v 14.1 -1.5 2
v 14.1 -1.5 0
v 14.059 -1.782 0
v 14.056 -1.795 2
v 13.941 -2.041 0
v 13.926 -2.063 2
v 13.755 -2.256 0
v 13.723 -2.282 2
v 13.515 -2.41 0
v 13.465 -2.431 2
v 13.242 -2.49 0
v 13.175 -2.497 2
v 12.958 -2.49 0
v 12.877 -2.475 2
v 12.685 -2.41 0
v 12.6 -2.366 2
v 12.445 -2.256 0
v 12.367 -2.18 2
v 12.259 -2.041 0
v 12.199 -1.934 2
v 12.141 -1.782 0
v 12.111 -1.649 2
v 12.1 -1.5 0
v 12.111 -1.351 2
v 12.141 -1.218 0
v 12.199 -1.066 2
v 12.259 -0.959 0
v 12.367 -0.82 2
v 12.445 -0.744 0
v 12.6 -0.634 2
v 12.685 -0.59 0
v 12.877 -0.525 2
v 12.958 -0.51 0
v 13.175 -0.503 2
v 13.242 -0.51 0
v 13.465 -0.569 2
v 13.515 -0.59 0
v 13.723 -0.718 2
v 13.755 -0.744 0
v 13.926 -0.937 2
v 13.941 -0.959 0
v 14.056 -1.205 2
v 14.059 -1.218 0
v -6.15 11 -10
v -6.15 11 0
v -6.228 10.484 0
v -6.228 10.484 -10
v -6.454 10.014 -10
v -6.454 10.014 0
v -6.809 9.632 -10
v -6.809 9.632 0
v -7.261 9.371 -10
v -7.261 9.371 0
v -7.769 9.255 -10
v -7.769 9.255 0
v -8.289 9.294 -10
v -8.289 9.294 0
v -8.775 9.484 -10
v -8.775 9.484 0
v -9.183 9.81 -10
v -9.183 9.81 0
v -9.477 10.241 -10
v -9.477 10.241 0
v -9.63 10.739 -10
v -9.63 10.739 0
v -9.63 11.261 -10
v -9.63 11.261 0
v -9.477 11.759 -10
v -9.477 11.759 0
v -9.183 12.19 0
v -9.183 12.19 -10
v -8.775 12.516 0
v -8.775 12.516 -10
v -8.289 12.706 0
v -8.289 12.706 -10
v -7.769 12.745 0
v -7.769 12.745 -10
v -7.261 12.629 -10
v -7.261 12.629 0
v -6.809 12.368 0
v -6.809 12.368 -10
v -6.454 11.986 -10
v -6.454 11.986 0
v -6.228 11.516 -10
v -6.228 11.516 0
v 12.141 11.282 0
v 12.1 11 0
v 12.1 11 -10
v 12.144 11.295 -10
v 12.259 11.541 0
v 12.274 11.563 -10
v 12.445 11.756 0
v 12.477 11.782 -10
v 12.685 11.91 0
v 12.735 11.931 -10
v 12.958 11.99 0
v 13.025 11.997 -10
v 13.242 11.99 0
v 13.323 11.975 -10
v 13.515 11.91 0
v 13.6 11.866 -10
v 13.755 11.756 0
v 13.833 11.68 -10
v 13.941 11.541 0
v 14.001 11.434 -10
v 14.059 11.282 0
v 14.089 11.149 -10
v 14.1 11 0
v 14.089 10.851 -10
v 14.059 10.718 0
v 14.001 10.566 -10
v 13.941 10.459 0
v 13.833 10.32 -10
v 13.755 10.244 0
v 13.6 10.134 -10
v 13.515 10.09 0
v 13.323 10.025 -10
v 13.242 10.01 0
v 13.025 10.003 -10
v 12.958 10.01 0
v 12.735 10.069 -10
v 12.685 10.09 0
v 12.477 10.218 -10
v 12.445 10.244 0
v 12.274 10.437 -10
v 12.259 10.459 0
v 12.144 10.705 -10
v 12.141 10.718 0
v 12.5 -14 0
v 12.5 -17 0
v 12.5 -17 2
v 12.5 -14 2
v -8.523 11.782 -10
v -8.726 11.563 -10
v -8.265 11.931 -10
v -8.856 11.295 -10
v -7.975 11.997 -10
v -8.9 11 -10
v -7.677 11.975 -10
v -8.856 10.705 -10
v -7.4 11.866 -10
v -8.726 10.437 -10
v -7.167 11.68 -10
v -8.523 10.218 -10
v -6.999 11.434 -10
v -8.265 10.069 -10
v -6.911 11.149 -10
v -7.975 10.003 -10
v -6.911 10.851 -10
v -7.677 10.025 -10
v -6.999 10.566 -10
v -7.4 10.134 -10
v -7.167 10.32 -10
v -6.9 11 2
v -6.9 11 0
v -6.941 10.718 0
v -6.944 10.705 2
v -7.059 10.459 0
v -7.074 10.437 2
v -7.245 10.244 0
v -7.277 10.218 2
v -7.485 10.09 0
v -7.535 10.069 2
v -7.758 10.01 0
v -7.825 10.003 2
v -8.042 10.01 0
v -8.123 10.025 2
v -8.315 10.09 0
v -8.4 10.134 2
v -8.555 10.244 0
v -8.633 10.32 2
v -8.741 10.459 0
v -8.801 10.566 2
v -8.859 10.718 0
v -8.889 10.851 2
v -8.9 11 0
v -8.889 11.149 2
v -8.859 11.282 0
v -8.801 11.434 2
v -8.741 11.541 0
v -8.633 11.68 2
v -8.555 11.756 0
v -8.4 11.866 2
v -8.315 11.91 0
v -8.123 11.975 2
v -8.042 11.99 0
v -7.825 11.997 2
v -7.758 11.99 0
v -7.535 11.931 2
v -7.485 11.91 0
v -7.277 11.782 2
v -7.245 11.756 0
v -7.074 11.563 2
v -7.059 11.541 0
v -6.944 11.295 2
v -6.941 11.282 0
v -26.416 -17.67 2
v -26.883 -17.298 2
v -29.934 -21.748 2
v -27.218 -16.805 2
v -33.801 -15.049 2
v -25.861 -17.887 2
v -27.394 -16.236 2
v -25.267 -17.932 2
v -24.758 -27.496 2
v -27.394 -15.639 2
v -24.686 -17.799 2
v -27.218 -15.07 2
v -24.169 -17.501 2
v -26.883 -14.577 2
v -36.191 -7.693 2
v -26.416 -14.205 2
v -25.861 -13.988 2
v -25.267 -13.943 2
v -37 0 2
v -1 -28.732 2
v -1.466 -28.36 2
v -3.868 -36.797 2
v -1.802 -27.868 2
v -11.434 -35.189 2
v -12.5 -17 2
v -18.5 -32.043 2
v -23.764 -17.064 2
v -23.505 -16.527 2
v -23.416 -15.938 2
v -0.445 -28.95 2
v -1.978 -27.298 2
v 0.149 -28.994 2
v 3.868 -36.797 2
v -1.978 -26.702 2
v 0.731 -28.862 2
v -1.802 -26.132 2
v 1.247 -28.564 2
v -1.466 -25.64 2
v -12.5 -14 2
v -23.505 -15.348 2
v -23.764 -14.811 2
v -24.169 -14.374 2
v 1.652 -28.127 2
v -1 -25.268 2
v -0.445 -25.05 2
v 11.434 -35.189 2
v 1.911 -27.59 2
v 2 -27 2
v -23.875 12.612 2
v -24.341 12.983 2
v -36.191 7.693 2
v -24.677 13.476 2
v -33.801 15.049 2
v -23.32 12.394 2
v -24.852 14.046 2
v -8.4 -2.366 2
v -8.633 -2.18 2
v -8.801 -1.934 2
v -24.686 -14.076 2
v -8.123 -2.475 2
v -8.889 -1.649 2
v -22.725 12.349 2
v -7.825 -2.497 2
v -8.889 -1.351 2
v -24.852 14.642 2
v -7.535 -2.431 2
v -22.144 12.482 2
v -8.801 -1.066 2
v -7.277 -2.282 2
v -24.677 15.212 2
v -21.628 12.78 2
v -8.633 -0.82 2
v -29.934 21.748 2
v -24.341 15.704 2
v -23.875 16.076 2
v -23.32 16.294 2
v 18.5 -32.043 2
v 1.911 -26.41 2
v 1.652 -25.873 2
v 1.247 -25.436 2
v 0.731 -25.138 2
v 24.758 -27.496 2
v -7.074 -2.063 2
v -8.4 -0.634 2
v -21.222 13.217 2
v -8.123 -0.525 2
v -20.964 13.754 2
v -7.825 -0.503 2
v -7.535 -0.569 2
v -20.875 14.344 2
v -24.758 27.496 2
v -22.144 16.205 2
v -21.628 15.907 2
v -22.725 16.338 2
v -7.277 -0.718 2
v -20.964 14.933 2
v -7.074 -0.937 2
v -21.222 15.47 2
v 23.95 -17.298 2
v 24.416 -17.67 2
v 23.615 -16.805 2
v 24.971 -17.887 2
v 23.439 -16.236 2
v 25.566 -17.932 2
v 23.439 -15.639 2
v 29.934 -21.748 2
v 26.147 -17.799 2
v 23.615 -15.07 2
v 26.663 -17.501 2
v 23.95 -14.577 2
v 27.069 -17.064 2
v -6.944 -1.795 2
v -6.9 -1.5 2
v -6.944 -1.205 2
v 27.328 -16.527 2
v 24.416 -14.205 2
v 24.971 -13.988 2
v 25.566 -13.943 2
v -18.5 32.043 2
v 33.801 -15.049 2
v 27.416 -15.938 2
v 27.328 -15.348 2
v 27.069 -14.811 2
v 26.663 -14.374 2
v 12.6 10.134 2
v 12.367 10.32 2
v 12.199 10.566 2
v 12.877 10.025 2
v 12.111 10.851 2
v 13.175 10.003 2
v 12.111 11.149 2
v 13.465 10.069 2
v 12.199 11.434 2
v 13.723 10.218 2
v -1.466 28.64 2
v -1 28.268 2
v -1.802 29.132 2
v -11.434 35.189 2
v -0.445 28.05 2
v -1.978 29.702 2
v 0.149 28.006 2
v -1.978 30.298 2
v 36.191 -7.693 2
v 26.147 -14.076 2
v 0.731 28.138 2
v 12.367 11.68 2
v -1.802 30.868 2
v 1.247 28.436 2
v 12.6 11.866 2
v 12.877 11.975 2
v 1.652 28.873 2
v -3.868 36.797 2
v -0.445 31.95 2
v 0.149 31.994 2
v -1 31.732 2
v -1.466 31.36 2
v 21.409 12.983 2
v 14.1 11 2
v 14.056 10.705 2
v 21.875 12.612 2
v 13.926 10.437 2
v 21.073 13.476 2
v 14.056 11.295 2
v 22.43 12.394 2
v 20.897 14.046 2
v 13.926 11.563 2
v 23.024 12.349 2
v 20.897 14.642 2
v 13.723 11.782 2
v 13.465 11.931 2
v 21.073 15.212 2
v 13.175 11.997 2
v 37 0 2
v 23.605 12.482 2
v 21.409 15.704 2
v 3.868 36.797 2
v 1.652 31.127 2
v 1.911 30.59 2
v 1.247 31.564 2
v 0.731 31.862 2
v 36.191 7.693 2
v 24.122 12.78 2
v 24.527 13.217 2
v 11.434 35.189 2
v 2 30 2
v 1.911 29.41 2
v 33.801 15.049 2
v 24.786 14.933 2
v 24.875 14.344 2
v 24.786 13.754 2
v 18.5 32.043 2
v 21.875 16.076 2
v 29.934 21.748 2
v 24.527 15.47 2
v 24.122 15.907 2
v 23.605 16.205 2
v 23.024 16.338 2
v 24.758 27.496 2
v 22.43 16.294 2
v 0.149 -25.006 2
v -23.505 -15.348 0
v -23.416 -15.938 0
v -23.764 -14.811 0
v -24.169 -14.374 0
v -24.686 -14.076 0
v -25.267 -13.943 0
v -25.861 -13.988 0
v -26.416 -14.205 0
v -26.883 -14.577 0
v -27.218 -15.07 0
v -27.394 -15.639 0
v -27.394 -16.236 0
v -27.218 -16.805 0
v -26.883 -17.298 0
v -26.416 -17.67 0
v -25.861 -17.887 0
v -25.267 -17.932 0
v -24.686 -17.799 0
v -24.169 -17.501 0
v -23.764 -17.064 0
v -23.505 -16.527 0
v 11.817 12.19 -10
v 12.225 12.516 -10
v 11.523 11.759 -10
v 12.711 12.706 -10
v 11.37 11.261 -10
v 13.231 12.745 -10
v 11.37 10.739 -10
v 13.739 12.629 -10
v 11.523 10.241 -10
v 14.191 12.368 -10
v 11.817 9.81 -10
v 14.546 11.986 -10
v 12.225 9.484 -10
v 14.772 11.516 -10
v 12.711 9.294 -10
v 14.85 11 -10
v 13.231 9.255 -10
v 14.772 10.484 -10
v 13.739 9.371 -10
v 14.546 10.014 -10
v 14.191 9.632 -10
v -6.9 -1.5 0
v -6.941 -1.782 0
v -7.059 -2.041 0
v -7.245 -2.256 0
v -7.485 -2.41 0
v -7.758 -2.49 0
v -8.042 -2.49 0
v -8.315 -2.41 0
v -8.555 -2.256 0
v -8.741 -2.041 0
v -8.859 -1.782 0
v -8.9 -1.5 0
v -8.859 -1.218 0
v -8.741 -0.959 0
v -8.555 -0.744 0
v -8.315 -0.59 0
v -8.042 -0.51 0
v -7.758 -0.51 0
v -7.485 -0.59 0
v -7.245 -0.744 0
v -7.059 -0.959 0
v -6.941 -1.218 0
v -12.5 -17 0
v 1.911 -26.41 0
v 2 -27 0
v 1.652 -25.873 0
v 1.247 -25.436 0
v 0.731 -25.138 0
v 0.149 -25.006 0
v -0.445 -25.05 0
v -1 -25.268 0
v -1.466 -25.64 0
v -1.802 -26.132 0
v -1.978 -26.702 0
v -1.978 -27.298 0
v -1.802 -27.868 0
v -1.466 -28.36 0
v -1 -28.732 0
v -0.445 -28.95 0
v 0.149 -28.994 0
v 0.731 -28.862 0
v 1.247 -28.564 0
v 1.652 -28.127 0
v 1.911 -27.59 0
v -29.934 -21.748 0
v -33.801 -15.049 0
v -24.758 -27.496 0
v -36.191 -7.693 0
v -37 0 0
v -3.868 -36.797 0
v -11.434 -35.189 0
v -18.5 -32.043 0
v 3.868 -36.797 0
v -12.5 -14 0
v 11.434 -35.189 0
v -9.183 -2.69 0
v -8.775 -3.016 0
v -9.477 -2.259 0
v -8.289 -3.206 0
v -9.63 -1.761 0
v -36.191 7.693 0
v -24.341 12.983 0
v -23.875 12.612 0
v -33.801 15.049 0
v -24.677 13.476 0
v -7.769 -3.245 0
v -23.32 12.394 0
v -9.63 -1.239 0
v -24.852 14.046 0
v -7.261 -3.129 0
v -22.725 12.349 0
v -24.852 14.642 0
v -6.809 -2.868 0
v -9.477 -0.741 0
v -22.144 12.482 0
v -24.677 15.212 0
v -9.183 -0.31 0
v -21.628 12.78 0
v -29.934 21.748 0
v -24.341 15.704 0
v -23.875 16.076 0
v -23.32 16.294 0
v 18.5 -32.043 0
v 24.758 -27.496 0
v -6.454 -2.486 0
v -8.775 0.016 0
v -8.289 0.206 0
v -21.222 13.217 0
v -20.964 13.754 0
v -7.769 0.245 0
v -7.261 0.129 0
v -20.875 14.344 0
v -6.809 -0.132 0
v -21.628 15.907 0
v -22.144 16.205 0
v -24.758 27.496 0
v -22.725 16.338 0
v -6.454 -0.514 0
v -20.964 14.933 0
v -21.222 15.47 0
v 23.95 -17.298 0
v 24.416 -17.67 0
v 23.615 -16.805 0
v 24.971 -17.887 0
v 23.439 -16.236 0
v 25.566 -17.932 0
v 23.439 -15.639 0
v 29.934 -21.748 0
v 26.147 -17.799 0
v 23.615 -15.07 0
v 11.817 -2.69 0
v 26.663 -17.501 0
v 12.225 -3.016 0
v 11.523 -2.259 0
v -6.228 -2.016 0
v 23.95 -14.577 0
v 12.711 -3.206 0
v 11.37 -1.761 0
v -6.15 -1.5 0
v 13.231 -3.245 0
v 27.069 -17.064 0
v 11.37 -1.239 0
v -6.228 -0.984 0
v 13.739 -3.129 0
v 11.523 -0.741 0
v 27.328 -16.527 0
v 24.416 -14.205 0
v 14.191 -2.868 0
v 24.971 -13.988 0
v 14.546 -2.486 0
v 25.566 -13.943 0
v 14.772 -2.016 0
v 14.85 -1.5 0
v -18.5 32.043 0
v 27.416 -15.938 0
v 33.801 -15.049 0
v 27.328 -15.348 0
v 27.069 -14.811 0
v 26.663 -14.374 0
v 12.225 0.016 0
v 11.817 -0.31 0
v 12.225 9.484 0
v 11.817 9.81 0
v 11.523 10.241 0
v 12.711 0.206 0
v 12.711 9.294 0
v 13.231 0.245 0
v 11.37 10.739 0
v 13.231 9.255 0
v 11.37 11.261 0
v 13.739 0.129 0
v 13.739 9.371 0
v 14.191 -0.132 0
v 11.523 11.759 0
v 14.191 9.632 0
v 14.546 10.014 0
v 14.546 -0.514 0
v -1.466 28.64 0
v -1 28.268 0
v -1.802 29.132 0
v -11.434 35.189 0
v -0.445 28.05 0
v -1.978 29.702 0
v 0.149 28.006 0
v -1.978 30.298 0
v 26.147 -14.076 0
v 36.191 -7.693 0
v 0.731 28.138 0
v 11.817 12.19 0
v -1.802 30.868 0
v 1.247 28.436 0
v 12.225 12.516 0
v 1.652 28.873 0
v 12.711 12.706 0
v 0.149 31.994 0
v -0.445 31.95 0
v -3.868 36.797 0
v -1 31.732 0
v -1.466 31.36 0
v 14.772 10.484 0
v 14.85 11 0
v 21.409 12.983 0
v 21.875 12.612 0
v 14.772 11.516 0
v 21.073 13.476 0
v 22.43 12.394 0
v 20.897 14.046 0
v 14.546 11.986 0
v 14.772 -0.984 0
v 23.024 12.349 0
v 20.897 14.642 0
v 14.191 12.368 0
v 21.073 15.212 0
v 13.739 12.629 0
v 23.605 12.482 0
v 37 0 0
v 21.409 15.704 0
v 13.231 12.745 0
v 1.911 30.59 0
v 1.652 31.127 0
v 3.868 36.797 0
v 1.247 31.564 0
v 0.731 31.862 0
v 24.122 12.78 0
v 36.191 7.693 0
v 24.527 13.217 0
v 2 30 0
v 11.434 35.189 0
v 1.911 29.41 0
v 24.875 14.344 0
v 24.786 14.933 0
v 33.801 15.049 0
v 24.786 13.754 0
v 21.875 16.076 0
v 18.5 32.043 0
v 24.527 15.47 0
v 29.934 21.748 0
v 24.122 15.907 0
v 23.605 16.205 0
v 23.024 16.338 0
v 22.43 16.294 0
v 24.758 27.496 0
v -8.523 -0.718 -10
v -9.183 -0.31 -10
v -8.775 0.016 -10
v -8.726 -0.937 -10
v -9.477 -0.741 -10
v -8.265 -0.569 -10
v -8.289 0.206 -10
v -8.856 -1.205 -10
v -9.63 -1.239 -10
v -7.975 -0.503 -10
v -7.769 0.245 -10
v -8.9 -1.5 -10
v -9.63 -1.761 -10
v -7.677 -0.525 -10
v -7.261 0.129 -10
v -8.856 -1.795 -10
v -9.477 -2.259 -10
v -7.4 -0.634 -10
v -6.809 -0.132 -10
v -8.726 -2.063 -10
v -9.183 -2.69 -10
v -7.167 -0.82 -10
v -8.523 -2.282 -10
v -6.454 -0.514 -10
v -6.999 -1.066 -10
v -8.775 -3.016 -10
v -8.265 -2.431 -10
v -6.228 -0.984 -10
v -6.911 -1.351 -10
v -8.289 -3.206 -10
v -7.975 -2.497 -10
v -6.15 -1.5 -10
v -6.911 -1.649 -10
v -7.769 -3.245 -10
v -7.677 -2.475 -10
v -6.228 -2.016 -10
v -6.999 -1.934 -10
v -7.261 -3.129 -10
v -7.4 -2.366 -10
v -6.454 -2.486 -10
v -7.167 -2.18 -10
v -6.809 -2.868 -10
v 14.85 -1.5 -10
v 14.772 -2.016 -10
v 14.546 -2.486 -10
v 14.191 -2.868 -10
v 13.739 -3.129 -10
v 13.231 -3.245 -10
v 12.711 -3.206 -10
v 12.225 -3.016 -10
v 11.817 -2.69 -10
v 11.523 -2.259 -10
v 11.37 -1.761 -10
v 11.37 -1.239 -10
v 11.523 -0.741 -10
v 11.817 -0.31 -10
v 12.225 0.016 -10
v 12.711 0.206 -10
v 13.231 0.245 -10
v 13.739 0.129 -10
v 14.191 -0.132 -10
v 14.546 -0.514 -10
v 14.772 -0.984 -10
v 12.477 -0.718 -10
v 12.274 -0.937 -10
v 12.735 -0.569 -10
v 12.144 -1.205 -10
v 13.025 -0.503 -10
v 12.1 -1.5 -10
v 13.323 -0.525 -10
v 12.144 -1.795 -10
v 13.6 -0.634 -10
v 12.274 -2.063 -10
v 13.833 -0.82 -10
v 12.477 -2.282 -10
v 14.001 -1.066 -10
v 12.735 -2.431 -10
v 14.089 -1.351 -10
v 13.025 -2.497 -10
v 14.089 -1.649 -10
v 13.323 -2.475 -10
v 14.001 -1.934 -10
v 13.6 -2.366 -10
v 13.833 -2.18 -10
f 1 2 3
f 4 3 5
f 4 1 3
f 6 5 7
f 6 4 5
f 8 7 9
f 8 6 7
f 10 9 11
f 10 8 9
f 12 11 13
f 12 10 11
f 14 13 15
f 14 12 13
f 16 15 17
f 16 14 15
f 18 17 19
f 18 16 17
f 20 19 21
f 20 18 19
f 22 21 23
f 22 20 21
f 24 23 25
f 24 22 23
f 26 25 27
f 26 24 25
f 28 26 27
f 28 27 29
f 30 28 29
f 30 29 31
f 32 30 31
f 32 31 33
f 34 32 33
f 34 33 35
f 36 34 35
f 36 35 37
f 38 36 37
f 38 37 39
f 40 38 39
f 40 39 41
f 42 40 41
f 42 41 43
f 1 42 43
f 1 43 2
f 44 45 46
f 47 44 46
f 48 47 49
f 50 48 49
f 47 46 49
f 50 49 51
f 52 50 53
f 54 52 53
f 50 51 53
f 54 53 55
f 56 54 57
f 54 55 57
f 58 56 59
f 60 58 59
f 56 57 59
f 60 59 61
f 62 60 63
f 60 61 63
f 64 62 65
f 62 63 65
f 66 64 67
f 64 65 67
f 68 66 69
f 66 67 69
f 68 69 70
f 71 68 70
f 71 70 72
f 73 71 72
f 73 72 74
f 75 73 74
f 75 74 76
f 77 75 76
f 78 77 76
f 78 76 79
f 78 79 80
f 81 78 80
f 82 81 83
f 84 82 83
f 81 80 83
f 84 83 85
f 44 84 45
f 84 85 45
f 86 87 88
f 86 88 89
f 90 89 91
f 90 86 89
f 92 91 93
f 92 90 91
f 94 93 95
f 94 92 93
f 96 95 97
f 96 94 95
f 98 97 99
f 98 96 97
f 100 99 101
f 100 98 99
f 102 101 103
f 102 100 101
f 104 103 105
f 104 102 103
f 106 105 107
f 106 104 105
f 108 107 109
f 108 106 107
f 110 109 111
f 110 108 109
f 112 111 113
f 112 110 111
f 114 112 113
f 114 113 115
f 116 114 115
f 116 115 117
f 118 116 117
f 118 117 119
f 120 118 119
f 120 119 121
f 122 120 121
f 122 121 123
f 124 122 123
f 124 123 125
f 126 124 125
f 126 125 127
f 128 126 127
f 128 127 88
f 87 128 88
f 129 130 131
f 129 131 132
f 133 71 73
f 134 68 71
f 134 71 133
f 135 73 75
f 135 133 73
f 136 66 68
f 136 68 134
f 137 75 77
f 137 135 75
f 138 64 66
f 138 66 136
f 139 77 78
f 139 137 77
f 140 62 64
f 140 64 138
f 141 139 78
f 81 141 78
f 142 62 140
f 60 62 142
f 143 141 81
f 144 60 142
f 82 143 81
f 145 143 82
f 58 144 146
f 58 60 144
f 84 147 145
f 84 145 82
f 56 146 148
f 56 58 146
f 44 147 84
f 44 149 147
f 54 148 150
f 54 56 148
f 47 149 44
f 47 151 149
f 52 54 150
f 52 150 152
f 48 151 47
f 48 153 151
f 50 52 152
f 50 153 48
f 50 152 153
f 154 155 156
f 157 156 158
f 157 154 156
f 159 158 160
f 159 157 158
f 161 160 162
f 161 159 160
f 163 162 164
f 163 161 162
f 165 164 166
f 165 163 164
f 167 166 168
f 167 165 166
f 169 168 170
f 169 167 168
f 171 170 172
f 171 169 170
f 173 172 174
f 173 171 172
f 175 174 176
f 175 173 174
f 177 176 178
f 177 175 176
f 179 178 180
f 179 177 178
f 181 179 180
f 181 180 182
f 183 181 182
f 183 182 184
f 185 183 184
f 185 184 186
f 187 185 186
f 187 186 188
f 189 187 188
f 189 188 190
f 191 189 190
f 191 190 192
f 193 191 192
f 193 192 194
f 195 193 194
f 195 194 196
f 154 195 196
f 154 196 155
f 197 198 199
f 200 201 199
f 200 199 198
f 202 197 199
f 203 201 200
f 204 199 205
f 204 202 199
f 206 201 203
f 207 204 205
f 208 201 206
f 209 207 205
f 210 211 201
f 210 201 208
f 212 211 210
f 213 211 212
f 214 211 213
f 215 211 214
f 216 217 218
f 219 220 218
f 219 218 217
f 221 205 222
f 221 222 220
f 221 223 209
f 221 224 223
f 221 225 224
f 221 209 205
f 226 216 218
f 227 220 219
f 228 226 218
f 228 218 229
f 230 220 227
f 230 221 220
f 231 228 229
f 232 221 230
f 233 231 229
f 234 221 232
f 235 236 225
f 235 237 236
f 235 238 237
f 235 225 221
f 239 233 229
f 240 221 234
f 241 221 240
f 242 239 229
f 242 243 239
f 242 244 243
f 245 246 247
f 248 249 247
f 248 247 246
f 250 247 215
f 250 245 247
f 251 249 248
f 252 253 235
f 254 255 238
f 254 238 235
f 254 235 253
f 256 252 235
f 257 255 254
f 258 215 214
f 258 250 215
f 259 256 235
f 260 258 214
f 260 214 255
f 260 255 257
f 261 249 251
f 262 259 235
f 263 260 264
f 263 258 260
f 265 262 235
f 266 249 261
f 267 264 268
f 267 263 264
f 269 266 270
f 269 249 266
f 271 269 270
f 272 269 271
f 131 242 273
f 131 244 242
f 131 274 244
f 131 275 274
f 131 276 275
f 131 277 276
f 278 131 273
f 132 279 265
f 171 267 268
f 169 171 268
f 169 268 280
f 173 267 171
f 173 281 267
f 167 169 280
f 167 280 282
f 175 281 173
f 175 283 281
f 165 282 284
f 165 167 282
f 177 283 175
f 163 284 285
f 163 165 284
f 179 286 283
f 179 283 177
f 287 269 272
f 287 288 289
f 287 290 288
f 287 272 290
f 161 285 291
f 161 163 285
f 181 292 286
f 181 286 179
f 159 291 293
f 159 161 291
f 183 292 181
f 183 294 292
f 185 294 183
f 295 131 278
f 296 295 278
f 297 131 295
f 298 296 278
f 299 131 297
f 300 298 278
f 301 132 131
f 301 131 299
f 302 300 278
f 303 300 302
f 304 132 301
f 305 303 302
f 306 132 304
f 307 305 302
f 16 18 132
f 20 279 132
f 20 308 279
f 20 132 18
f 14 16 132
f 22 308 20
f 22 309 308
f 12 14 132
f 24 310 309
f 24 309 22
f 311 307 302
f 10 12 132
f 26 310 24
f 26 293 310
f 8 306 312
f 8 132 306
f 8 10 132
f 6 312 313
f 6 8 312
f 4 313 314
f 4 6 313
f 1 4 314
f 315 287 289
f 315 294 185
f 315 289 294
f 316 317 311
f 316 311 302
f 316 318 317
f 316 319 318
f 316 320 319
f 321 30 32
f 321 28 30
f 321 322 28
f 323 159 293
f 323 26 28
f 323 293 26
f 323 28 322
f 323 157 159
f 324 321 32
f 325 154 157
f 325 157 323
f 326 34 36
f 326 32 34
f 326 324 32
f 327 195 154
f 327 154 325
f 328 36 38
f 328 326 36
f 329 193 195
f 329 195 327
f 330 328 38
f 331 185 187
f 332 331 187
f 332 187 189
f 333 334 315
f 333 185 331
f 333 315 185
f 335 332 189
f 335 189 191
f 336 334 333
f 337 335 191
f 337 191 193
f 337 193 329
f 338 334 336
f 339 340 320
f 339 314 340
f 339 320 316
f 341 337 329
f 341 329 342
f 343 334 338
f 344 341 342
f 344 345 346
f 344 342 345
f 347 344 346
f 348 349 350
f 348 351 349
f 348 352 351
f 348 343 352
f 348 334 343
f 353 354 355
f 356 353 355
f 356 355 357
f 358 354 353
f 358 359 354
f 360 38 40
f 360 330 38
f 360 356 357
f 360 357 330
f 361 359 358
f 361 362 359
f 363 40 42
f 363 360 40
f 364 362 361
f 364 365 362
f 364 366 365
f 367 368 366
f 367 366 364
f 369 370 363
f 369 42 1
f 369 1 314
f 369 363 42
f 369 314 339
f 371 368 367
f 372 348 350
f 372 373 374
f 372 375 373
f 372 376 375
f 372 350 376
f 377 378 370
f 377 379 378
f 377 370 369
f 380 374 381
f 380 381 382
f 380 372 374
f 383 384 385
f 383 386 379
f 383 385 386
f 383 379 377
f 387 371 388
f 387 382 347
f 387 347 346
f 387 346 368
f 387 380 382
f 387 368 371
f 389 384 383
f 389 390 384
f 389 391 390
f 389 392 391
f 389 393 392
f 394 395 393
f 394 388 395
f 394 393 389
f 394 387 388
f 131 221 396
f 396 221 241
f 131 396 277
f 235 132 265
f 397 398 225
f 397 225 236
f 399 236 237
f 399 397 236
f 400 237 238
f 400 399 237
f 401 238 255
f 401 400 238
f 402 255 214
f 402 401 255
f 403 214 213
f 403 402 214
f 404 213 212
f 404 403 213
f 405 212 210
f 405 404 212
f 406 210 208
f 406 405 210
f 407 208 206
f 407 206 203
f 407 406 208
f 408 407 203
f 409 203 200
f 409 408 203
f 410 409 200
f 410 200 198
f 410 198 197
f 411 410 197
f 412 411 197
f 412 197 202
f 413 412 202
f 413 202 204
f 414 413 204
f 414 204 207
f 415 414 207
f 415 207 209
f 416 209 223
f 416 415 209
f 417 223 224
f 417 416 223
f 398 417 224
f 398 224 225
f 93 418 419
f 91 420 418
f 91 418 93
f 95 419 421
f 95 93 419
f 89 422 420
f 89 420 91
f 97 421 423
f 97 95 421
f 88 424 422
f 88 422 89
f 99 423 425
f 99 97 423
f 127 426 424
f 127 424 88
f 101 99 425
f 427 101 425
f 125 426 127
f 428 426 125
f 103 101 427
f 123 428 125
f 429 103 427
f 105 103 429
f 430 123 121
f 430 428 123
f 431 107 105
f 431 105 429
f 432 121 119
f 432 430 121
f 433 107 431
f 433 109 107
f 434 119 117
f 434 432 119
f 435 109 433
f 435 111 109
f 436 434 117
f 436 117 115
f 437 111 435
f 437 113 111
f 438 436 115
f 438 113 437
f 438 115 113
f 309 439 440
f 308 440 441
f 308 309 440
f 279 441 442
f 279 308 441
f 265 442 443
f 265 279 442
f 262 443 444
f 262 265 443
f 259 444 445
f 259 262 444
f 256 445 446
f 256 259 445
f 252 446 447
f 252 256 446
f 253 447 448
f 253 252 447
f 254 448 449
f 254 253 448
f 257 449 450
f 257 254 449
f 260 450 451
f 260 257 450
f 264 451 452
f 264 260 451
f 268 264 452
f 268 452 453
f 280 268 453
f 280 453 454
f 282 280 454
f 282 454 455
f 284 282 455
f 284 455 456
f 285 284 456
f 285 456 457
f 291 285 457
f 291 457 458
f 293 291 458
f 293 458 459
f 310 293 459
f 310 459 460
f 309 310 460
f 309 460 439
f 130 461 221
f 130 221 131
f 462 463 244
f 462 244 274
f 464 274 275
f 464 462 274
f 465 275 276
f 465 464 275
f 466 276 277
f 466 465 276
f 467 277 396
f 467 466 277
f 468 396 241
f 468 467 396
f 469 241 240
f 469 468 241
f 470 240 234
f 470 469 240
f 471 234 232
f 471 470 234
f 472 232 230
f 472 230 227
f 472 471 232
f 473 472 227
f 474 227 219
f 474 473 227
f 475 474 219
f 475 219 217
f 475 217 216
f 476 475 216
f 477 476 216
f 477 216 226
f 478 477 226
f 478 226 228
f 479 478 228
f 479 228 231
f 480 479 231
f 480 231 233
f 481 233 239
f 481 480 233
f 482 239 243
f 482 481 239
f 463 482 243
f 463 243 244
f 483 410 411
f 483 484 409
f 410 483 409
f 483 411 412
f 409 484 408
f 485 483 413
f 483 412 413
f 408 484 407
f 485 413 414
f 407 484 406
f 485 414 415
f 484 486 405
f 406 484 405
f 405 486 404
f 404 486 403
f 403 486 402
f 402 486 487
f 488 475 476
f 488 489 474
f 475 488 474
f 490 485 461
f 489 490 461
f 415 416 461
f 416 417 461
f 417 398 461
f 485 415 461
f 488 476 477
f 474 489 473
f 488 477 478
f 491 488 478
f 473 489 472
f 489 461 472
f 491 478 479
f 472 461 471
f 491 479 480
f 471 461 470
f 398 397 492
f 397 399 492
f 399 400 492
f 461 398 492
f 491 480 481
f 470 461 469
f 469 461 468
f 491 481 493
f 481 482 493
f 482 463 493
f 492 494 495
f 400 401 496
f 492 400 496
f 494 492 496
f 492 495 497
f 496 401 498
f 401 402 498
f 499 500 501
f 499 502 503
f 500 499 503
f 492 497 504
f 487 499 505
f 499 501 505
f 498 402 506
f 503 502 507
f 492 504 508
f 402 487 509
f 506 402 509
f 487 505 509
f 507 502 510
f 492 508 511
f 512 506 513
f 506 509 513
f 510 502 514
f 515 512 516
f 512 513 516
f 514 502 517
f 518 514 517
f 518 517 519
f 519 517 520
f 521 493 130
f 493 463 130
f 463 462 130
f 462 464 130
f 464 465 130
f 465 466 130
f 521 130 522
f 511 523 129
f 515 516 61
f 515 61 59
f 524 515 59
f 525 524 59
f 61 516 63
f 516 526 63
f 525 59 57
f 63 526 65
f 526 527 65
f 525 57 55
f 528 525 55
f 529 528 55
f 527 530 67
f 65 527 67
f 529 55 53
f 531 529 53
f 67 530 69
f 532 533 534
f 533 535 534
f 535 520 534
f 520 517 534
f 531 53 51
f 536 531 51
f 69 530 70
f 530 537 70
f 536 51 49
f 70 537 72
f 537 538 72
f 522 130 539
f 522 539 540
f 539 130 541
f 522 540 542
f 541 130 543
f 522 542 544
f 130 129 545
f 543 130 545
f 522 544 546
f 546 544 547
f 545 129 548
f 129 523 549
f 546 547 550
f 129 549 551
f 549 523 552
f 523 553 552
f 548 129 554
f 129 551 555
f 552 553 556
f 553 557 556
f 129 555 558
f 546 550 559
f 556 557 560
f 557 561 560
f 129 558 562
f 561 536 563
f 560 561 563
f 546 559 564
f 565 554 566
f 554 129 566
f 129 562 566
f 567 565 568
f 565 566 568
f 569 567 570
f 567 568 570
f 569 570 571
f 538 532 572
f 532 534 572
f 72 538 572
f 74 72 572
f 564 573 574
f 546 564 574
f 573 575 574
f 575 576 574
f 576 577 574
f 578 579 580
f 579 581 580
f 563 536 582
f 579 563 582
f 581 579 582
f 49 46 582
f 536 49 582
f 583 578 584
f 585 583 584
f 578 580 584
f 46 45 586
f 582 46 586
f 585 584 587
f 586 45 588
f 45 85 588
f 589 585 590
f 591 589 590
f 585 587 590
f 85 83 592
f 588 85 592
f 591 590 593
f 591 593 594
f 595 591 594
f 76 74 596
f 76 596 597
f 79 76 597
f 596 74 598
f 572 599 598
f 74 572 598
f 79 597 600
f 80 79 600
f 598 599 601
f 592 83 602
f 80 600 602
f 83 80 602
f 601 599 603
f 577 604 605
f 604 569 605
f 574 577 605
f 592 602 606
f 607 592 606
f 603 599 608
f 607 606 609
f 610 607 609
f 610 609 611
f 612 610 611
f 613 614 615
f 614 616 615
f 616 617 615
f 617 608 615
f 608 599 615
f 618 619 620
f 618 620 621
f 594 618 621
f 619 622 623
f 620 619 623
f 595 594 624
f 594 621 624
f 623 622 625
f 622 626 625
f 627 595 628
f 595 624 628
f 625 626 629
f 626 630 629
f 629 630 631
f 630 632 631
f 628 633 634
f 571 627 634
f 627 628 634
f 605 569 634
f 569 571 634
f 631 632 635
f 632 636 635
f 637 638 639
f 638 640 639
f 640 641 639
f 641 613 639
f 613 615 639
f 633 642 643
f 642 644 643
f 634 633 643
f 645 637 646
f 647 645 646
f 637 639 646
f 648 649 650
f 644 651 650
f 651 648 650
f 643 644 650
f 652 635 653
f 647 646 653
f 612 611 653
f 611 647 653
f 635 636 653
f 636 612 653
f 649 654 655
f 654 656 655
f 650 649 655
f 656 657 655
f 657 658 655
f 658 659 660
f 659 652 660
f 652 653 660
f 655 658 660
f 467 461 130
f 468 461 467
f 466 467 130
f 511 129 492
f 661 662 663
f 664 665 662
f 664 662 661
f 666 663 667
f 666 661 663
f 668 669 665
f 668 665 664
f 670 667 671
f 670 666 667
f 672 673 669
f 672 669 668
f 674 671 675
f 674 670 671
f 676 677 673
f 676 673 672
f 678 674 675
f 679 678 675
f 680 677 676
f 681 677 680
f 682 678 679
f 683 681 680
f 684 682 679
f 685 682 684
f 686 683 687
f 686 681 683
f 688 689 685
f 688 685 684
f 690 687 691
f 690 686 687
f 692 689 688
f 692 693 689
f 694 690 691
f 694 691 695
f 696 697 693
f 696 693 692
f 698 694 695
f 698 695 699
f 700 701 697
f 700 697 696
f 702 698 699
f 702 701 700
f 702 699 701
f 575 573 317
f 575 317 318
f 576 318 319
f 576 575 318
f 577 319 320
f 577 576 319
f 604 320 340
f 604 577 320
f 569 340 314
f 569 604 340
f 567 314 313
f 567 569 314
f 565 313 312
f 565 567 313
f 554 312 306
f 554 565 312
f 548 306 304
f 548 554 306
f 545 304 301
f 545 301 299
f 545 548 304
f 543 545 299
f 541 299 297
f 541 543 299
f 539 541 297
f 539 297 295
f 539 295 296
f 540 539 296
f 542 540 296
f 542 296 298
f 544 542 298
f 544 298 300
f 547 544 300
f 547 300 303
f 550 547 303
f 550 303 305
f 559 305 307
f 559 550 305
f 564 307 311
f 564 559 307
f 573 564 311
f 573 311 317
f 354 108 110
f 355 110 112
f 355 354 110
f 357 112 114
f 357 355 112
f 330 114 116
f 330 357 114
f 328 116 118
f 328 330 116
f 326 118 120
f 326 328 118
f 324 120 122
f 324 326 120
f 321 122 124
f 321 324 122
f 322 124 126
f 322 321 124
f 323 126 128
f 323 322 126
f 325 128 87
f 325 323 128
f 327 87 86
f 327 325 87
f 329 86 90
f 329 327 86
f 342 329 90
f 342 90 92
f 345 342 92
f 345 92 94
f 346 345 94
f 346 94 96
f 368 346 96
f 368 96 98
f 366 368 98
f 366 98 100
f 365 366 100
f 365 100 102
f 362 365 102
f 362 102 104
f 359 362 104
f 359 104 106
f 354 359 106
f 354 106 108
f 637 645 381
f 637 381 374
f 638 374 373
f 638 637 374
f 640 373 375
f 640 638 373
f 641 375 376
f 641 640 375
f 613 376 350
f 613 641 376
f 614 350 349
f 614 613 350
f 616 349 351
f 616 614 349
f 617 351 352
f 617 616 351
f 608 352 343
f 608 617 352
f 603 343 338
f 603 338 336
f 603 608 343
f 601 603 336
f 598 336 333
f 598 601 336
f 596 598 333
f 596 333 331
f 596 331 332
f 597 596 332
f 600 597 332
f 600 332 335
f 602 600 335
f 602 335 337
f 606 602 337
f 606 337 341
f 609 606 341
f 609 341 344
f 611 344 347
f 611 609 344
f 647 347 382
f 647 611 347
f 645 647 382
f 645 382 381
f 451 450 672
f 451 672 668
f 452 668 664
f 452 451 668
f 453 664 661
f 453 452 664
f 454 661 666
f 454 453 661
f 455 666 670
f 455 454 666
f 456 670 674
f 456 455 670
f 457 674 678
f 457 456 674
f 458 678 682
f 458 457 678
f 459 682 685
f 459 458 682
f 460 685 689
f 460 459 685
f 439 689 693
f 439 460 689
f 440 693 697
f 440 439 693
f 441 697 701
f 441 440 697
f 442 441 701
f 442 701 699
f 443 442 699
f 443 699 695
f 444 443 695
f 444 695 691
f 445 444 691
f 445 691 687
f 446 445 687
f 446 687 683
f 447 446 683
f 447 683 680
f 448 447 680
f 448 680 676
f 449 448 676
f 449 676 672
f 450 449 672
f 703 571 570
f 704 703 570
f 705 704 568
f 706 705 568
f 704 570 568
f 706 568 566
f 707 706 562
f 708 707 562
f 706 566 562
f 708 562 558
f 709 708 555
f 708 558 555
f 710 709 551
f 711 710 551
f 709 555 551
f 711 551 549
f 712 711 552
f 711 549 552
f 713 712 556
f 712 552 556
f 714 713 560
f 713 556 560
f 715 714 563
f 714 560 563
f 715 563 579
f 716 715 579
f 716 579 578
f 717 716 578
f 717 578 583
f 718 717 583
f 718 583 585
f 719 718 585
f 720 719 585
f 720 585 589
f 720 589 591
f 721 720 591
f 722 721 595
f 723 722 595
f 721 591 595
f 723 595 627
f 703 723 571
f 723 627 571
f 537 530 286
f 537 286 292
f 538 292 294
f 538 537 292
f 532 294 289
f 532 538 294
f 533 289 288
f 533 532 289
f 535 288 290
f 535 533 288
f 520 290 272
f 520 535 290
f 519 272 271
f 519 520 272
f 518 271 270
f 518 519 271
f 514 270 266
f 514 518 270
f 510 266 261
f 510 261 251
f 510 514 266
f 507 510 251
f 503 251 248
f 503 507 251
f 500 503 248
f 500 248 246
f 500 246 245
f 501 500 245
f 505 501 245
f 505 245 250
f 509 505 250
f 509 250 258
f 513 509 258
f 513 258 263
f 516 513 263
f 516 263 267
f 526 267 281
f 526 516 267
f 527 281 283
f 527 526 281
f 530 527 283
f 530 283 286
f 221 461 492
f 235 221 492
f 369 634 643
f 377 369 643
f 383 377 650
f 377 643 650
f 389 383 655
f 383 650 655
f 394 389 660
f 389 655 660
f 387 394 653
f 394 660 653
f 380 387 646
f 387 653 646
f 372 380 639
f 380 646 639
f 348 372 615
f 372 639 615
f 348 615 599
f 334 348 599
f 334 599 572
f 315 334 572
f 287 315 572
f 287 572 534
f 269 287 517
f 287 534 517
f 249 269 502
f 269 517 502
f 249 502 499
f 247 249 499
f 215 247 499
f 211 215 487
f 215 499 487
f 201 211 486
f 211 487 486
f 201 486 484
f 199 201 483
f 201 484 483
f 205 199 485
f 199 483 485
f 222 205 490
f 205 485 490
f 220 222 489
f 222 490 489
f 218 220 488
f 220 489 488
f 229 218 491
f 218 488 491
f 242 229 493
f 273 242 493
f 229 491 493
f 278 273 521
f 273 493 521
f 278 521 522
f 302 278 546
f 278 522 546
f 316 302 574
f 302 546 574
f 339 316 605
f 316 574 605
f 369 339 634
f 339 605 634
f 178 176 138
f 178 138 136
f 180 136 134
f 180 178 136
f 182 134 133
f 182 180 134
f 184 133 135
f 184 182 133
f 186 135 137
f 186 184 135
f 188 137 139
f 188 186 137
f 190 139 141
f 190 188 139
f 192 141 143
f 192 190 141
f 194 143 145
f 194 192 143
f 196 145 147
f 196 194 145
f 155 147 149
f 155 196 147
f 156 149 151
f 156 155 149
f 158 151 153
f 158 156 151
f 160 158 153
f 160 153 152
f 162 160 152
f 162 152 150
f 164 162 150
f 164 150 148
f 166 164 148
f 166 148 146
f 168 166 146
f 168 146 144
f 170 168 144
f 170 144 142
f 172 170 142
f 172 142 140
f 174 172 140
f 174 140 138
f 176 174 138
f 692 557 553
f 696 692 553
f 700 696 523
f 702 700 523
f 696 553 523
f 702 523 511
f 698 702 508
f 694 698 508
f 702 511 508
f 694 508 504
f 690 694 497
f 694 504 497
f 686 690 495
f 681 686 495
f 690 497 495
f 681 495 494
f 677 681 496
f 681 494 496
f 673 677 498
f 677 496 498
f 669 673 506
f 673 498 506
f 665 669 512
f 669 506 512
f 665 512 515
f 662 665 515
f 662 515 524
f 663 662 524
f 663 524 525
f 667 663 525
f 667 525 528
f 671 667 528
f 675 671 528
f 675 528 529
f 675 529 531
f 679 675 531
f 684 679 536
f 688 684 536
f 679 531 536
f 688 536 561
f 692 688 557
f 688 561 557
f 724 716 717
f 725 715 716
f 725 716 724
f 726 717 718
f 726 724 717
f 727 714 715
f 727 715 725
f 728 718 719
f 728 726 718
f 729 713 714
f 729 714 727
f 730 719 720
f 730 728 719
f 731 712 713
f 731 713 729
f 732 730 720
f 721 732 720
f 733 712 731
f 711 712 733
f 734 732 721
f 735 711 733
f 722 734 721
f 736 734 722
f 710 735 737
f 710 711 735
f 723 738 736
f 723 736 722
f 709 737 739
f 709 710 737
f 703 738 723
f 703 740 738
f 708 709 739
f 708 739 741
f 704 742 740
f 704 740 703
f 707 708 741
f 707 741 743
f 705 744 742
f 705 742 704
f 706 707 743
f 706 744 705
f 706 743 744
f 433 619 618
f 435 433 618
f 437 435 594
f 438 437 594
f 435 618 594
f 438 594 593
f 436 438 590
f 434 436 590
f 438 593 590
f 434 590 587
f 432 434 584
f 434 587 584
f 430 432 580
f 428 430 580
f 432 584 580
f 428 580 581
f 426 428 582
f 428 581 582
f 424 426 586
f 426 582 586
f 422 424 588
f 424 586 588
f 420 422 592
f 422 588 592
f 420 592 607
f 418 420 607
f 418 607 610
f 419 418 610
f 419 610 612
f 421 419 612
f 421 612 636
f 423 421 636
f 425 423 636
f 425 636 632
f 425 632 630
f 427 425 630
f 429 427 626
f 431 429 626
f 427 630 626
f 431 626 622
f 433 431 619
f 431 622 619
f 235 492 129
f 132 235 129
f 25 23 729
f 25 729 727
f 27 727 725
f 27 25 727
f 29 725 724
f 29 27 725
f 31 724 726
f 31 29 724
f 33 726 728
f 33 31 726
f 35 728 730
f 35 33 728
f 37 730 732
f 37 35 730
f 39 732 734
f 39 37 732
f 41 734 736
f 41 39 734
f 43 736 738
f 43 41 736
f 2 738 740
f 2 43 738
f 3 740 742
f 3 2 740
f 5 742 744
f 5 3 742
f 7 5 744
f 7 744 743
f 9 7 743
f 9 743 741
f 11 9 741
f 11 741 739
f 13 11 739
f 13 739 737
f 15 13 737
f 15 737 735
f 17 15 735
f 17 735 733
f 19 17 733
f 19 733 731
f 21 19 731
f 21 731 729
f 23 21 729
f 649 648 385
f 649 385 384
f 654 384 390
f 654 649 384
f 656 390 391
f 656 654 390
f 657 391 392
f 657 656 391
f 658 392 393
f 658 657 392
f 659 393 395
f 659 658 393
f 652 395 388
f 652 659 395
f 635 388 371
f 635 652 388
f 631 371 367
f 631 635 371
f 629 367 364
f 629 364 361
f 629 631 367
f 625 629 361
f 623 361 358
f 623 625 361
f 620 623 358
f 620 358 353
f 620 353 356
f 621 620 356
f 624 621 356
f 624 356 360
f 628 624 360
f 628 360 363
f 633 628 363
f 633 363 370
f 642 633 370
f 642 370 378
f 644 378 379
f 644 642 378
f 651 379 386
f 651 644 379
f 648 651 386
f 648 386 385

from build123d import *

# Parameters (mm, degrees)
ESQUISSE1_R             = 37
ESQUISSE1_R_2           = 2
ESQUISSE1_W             = 25
ESQUISSE1_H             = 3
BOSS_EXTRU_1_DEPTH      = 2
BOSS_EXTRU_2_DEPTH      = 15
ESQUISSE3_W             = 2
ESQUISSE3_H             = 28.4
BOSS_EXTRU_3_DEPTH      = 2.25
ESQUISSE5_W             = 2
ESQUISSE5_H             = 24.4
BOSS_EXTRU_4_DEPTH      = 2.25
ESQUISSE7_W             = 33.1
ESQUISSE7_H             = 28.4
BOSS_EXTRU_5_DEPTH      = 1
ESQUISSE8_W             = 15
ESQUISSE8_H             = 15
ENL_V_MAT_EXTRU_1_DEPTH = 3
ESQUISSE9_W             = 21
ESQUISSE9_H             = 2.5
ENL_V_MAT_EXTRU_2_DEPTH = 3
ESQUISSE11_W            = 33.1
ESQUISSE11_H            = 28.4
ENL_V_MAT_EXTRU_4_DEPTH = 15
SKETCH1_R               = 1.75
SKETCH1_R_2             = 1
BOSS_EXTRUDE1_DEPTH     = 10
CUT_EXTRUDE1_START      = -10
SKETCH1_3_R             = 1
CUT_EXTRUDE1_DEPTH      = 10


with BuildPart() as part:
    # Esquisse1 → Boss.-Extru.1 (new body)
    with BuildSketch(Plane.XY):
        Circle(ESQUISSE1_R)
        with Locations((0, 30)):
            Circle(ESQUISSE1_R_2, mode=Mode.SUBTRACT)
        with Locations((-22.874807889, 14.34375)):
            Circle(ESQUISSE1_R_2, mode=Mode.SUBTRACT)
        with Locations((-25.416453209, -15.9375)):
            Circle(ESQUISSE1_R_2, mode=Mode.SUBTRACT)
        with Locations((0, -27)):
            Circle(ESQUISSE1_R_2, mode=Mode.SUBTRACT)
        with Locations((25.416453209, -15.9375)):
            Circle(ESQUISSE1_R_2, mode=Mode.SUBTRACT)
        with Locations((22.874807889, 14.34375)):
            Circle(ESQUISSE1_R_2, mode=Mode.SUBTRACT)
        with Locations((0, -15.5)):
            Rectangle(ESQUISSE1_W, ESQUISSE1_H, mode=Mode.SUBTRACT)
    extrude(amount=BOSS_EXTRU_1_DEPTH)

    # Esquisse2 → Boss.-Extru.2 (add)
    with BuildSketch(Plane(origin=(0, 0, 0), x_dir=(-1, 0, 0), z_dir=(0, 0, -1))):
        Polygon((-12.55, 14.9), (-16.55, 14.9), (-16.55, -13.5), (16.55, -13.5), (16.55, 14.9), (12.55, 14.9), (12.55, -9.5), (-12.55, -9.5), align=None)
    extrude(amount=BOSS_EXTRU_2_DEPTH)

    # Esquisse3 → Boss.-Extru.3 (add)
    with BuildSketch(Plane(origin=(-12.55, 0, 0), x_dir=(0, 0, -1), z_dir=(1, 0, 0))):
        with Locations((9.625, 0.7)):
            Rectangle(ESQUISSE3_W, ESQUISSE3_H)
        with Locations((6.625, 0.7)):
            Rectangle(ESQUISSE3_W, ESQUISSE3_H)
    extrude(amount=BOSS_EXTRU_3_DEPTH)

    # Esquisse5 → Boss.-Extru.4 (add)
    with BuildSketch(Plane.ZY.offset(-12.55)):
        with Locations((-9.625, 2.7)):
            Rectangle(ESQUISSE5_W, ESQUISSE5_H)
        with Locations((-6.625, 2.7)):
            Rectangle(ESQUISSE5_W, ESQUISSE5_H)
    extrude(amount=BOSS_EXTRU_4_DEPTH)

    # Esquisse7 → Boss.-Extru.5 (add)
    with BuildSketch(Plane(origin=(0, 0, -15), x_dir=(-1, 0, 0), z_dir=(0, 0, -1))):
        with Locations((0, 0.7)):
            Rectangle(ESQUISSE7_W, ESQUISSE7_H)
    extrude(amount=-BOSS_EXTRU_5_DEPTH)

    # Esquisse8 → Enlèv. mat.-Extru.1 (cut)
    with BuildSketch(Plane(origin=(0, 0, -15), x_dir=(-1, 0, 0), z_dir=(0, 0, -1))):
        Rectangle(ESQUISSE8_W, ESQUISSE8_H)
    extrude(amount=-ENL_V_MAT_EXTRU_1_DEPTH, mode=Mode.SUBTRACT)

    # Esquisse9 → Enlèv. mat.-Extru.2 (cut)
    with BuildSketch(Plane.XZ.offset(13.5)):
        with Locations((0, -5.65)):
            Rectangle(ESQUISSE9_W, ESQUISSE9_H)
    extrude(amount=-ENL_V_MAT_EXTRU_2_DEPTH, mode=Mode.SUBTRACT)

    # Esquisse11 → Enlèv. mat.-Extru.4 (cut)
    with BuildSketch(Plane(origin=(0, 0, -15), x_dir=(-1, 0, 0), z_dir=(0, 0, -1))):
        with Locations((0, 0.7)):
            Rectangle(ESQUISSE11_W, ESQUISSE11_H)
    extrude(amount=-ENL_V_MAT_EXTRU_4_DEPTH, mode=Mode.SUBTRACT)

    # Sketch1 → Boss-Extrude1 (add)
    # profile 1 of 4: a face of its own
    with BuildSketch(Plane(origin=(0, 0, 0), x_dir=(-1, 0, 0), z_dir=(0, 0, -1))):
        with Locations((-13.1, 11)):
            Circle(SKETCH1_R)
        with Locations((-13.1, 11)):
            Circle(SKETCH1_R_2, mode=Mode.SUBTRACT)
    # profile 2 of 4: a face of its own
    with BuildSketch(Plane(origin=(0, 0, 0), x_dir=(-1, 0, 0), z_dir=(0, 0, -1))):
        with Locations((-13.1, -1.5)):
            Circle(SKETCH1_R)
        with Locations((-13.1, -1.5)):
            Circle(SKETCH1_R_2, mode=Mode.SUBTRACT)
    # profile 3 of 4: a face of its own
    with BuildSketch(Plane(origin=(0, 0, 0), x_dir=(-1, 0, 0), z_dir=(0, 0, -1))):
        with Locations((7.9, 11)):
            Circle(SKETCH1_R)
        with Locations((7.9, 11)):
            Circle(SKETCH1_R_2, mode=Mode.SUBTRACT)
    # profile 4 of 4: a face of its own
    with BuildSketch(Plane(origin=(0, 0, 0), x_dir=(-1, 0, 0), z_dir=(0, 0, -1))):
        with Locations((7.9, -1.5)):
            Circle(SKETCH1_R)
        with Locations((7.9, -1.5)):
            Circle(SKETCH1_R_2, mode=Mode.SUBTRACT)
    extrude(amount=BOSS_EXTRUDE1_DEPTH)

    # Sketch1<3> → Cut-Extrude1 (cut)
    with BuildSketch(Plane(origin=(0, 0, 0), x_dir=(-1, 0, 0), z_dir=(0, 0, -1)).offset(CUT_EXTRUDE1_START)):
        with Locations((7.9, -1.5)):
            Circle(SKETCH1_3_R)
        with Locations((-13.1, -1.5)):
            Circle(SKETCH1_3_R)
        with Locations((7.9, 11)):
            Circle(SKETCH1_3_R)
        with Locations((-13.1, 11)):
            Circle(SKETCH1_3_R)
    extrude(amount=CUT_EXTRUDE1_DEPTH, mode=Mode.SUBTRACT)


solid = part.part
